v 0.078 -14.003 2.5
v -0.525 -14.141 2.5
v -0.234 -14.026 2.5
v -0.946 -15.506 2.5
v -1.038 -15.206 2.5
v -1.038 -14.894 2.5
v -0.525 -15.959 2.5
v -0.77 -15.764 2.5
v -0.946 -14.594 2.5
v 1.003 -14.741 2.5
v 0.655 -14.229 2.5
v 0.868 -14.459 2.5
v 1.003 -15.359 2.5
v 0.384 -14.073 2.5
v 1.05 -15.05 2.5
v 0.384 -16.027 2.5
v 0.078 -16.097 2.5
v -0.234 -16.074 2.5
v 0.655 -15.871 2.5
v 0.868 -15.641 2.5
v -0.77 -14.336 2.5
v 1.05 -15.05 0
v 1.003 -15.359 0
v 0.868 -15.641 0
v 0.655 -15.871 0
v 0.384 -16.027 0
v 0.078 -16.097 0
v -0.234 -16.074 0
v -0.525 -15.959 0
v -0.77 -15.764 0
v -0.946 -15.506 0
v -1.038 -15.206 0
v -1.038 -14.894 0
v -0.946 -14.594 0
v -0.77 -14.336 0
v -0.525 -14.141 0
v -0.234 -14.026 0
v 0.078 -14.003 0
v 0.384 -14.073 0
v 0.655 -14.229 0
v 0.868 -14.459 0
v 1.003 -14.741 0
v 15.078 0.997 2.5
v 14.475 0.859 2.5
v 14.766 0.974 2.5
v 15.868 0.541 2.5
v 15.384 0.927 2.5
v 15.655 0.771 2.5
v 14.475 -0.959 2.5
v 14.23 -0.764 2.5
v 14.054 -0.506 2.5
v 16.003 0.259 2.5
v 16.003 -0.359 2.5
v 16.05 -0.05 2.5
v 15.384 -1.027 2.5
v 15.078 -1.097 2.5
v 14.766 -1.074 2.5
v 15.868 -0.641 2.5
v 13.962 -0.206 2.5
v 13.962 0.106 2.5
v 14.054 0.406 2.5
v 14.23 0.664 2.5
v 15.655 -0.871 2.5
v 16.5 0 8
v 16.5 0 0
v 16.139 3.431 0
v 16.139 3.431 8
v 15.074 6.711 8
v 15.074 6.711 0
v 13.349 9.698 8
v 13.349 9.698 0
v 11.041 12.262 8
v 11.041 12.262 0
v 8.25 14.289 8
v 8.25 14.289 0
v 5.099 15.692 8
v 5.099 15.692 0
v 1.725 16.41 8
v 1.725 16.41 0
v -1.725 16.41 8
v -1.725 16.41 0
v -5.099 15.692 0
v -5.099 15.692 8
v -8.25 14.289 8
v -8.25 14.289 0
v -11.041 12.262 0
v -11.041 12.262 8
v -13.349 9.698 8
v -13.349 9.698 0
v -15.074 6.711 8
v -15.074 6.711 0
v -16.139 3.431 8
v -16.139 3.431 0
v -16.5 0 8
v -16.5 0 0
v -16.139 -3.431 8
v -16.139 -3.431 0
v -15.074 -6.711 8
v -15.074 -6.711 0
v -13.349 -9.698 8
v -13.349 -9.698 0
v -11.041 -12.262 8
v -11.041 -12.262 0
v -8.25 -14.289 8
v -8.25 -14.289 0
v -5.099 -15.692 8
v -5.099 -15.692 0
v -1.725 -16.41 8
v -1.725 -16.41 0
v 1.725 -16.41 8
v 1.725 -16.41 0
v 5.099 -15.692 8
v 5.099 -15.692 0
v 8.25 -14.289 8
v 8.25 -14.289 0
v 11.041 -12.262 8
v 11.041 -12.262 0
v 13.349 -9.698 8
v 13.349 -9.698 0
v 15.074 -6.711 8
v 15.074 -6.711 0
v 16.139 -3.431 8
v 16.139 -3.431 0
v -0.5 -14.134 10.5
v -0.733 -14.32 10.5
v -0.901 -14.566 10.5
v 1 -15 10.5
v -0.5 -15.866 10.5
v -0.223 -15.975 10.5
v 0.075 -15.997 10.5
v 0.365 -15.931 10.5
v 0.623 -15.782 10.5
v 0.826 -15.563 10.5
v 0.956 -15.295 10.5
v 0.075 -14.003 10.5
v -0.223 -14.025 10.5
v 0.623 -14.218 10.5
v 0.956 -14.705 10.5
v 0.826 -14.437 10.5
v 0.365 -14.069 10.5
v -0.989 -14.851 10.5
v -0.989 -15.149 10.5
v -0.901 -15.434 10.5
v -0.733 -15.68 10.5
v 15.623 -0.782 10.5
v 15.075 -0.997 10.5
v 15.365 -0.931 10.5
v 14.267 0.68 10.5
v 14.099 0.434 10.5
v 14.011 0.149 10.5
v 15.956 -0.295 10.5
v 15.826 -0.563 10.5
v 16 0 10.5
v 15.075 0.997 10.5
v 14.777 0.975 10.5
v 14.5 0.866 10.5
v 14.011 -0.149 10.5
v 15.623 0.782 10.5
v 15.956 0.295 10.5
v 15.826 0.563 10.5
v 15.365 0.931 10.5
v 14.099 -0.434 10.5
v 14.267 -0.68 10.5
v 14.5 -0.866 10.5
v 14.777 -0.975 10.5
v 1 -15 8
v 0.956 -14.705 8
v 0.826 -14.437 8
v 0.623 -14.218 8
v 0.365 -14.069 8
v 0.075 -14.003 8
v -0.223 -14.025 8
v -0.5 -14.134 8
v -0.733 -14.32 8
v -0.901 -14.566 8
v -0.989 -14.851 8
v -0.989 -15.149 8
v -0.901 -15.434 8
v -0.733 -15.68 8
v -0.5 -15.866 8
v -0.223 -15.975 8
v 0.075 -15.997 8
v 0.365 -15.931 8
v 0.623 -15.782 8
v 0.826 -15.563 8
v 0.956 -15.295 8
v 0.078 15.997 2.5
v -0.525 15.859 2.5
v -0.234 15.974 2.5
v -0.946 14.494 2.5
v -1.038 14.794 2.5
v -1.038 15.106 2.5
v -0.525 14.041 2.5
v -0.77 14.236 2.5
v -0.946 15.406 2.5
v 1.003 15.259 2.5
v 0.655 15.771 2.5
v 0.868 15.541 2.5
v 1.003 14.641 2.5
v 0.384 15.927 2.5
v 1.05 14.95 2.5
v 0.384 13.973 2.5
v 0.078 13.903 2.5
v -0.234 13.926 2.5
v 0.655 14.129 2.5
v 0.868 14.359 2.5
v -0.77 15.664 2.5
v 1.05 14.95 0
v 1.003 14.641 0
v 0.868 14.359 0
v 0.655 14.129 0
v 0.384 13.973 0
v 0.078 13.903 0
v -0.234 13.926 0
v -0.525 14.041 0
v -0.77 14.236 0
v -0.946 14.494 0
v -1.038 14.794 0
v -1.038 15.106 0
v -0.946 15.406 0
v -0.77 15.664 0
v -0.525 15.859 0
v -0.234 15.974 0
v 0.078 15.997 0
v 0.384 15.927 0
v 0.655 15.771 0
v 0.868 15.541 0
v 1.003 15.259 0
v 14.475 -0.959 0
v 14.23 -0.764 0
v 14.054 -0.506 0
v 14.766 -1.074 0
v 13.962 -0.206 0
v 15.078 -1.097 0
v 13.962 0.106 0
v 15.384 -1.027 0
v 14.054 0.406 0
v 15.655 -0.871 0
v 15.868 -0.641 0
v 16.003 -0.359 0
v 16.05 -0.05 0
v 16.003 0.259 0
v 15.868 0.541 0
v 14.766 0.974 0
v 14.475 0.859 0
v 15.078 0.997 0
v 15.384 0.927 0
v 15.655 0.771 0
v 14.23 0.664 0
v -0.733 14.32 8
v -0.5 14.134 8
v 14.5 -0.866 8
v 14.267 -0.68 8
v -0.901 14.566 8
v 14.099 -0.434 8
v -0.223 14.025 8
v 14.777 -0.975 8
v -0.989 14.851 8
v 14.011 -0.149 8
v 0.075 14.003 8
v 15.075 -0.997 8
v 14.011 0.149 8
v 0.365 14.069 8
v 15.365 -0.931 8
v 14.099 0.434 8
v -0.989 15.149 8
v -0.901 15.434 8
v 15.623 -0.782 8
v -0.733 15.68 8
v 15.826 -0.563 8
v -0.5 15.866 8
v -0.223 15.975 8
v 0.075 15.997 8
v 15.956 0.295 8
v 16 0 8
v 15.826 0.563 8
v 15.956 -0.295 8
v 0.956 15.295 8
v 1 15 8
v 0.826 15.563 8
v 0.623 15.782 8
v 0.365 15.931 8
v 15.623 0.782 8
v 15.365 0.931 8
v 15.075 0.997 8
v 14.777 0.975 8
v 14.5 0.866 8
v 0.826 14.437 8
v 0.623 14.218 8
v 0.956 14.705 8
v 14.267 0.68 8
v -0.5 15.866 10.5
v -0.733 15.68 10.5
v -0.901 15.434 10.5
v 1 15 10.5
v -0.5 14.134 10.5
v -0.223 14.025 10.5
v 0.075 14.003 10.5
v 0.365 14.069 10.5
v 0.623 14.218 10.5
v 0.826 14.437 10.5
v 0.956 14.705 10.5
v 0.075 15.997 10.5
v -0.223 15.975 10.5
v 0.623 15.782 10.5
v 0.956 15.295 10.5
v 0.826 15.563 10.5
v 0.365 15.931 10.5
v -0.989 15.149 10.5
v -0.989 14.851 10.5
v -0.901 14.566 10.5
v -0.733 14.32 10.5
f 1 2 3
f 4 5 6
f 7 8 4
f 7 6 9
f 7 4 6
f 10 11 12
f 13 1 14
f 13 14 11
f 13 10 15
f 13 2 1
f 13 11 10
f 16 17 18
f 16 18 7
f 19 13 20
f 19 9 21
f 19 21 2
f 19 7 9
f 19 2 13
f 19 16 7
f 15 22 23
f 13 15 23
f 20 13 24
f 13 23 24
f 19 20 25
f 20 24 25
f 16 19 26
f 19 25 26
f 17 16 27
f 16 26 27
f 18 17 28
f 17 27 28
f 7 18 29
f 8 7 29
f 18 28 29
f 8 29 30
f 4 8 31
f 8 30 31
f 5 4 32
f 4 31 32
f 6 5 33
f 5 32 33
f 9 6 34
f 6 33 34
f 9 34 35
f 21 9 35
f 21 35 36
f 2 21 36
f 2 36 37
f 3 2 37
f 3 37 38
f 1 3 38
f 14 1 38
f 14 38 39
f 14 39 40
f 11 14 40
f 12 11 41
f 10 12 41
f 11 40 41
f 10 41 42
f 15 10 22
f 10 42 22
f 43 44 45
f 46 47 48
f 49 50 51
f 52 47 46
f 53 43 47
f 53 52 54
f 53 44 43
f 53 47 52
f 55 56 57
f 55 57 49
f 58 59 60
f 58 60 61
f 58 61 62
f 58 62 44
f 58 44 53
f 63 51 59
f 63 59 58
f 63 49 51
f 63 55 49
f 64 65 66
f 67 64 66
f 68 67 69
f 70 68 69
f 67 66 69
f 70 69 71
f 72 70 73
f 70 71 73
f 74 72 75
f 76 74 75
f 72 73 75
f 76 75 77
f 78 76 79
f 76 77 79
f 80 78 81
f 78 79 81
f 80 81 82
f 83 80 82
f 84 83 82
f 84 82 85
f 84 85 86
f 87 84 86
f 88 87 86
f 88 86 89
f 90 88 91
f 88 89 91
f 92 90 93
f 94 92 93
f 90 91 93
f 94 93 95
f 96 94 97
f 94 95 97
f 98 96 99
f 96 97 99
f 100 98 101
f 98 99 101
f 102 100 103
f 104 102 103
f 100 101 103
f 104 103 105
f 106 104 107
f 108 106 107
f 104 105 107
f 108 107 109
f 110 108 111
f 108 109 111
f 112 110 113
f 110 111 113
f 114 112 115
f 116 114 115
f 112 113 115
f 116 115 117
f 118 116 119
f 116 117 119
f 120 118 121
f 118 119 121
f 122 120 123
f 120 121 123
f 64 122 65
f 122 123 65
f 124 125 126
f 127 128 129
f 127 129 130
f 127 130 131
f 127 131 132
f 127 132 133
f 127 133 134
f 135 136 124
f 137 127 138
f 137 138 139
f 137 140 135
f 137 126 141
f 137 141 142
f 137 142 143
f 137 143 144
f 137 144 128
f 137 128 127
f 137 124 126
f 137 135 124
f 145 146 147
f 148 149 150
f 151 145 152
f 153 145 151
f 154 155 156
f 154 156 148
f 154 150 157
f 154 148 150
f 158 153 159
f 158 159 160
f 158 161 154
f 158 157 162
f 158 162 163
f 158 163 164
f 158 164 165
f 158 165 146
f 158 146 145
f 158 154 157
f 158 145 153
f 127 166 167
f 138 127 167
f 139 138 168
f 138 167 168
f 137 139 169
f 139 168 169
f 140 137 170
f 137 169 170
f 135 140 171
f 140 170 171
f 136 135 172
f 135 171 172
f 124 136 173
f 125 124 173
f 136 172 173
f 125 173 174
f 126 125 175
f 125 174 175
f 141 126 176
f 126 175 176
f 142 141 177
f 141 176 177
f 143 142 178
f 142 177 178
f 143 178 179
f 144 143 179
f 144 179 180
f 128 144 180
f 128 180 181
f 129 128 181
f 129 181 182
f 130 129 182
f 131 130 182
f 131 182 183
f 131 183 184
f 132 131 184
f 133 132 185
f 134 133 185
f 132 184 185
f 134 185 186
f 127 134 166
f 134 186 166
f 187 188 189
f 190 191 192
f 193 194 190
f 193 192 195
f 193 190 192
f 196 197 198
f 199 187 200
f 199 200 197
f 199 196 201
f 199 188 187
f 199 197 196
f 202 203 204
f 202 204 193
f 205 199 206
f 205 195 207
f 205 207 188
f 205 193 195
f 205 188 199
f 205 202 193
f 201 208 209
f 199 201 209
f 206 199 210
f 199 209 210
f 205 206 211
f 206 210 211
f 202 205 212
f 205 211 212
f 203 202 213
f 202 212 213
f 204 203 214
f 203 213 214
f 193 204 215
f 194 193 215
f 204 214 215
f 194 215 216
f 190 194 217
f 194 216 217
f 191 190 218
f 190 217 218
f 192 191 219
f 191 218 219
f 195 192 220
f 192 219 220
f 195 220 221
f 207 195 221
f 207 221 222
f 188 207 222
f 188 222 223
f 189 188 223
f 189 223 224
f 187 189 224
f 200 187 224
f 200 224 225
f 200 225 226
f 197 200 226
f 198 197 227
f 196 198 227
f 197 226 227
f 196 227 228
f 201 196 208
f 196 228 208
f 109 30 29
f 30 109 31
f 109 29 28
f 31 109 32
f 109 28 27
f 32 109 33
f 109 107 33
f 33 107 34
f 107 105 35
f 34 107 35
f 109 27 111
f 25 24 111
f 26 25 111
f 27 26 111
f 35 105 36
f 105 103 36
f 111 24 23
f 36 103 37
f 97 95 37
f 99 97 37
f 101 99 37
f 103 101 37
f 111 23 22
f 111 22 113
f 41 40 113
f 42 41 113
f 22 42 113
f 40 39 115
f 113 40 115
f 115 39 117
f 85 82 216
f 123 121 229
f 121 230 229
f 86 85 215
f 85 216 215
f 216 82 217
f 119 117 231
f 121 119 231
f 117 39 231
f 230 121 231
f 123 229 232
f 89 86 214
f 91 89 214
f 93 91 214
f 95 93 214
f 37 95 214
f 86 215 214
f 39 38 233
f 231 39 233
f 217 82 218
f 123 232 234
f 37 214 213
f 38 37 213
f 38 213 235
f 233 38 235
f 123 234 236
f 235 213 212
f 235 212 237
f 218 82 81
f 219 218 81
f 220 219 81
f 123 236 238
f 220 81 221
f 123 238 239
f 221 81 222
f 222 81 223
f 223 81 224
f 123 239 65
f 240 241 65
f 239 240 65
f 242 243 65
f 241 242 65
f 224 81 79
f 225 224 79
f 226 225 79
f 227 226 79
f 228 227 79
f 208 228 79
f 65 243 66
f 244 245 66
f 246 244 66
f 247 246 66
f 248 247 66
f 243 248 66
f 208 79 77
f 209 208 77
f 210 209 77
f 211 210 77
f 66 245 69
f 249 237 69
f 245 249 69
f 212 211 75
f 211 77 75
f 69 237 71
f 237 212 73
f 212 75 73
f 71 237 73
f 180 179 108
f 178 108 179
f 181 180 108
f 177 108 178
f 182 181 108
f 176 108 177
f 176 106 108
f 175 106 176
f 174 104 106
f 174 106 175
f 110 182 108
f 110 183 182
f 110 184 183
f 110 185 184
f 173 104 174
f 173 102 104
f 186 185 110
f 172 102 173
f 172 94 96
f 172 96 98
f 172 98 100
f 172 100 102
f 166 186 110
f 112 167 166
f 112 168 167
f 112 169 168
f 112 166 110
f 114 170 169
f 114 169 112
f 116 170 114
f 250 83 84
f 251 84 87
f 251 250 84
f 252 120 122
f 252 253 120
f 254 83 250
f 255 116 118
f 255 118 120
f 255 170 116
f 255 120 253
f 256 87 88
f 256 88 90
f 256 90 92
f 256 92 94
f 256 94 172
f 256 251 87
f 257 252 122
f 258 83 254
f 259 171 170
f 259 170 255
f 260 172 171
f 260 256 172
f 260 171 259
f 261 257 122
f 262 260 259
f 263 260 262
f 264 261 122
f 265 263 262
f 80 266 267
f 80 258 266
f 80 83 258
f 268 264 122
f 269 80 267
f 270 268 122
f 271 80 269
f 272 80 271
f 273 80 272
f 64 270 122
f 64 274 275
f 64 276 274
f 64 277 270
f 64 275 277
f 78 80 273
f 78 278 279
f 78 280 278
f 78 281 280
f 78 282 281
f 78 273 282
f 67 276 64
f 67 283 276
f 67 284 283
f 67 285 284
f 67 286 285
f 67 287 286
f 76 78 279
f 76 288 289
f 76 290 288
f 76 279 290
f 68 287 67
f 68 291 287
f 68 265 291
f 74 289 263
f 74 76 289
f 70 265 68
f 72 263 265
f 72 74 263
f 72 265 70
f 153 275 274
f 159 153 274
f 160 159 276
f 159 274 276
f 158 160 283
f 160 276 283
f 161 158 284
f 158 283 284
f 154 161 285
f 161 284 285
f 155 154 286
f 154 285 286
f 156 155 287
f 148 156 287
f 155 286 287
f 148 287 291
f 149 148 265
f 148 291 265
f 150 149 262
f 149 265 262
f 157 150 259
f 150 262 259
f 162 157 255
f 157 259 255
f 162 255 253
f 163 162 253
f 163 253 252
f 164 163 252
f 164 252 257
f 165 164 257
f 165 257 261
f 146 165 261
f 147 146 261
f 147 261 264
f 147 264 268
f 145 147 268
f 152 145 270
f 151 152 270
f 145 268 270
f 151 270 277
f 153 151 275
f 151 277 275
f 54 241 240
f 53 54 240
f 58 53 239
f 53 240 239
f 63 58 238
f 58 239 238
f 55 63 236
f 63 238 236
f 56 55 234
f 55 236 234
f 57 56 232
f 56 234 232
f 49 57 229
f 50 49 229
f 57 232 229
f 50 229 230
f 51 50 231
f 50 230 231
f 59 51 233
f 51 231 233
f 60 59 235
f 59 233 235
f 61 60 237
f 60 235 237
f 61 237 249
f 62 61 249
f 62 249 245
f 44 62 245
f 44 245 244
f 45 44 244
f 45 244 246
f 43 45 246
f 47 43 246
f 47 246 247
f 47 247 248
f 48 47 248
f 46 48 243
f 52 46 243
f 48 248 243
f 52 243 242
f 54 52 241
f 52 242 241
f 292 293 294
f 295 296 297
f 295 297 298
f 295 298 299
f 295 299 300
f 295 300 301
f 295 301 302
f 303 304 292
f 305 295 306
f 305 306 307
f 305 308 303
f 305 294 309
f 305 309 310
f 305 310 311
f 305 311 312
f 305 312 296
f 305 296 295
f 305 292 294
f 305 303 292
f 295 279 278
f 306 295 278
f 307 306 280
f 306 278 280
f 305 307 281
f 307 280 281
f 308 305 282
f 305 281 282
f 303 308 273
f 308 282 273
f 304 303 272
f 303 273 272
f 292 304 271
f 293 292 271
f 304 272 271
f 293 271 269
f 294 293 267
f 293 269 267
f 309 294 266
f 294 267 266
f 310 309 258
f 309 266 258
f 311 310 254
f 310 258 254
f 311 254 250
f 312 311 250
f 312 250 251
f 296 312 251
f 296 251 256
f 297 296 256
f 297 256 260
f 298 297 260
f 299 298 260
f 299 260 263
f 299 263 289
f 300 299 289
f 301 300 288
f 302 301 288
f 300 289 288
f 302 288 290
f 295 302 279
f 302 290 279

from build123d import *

# Parameters (mm, degrees)
F0_R     = 16.5
F1_DEPTH = 8
F2_R     = 1.05
F3_DEPTH = 2.5
F4_R     = 1
F5_DEPTH = 2.5


with BuildPart() as f1:
    # F0 (on Top) → F1 (new body)
    with BuildSketch(Plane.XY):
        Circle(F0_R)
    extrude(amount=F1_DEPTH)

    # F2 (on face) → F3 (cut)
    with BuildSketch(Plane(origin=(0, 0, 0), x_dir=(1, 0, 0), z_dir=(0, 0, -1))):
        with Locations((0, 15.05)):
            Circle(F2_R)
        with Locations((15, 0.05)):
            Circle(F2_R)
        with Locations((0, -14.95)):
            Circle(F2_R)
    extrude(amount=-F3_DEPTH, mode=Mode.SUBTRACT)

    # F4 (on face) → F5 (join)
    with BuildSketch(Plane.XY.offset(8)):
        with Locations((0, 15)):
            Circle(F4_R)
        with Locations((15, 0)):
            Circle(F4_R)
        with Locations((0, -15)):
            Circle(F4_R)
    extrude(amount=F5_DEPTH)


solid = f1.part
